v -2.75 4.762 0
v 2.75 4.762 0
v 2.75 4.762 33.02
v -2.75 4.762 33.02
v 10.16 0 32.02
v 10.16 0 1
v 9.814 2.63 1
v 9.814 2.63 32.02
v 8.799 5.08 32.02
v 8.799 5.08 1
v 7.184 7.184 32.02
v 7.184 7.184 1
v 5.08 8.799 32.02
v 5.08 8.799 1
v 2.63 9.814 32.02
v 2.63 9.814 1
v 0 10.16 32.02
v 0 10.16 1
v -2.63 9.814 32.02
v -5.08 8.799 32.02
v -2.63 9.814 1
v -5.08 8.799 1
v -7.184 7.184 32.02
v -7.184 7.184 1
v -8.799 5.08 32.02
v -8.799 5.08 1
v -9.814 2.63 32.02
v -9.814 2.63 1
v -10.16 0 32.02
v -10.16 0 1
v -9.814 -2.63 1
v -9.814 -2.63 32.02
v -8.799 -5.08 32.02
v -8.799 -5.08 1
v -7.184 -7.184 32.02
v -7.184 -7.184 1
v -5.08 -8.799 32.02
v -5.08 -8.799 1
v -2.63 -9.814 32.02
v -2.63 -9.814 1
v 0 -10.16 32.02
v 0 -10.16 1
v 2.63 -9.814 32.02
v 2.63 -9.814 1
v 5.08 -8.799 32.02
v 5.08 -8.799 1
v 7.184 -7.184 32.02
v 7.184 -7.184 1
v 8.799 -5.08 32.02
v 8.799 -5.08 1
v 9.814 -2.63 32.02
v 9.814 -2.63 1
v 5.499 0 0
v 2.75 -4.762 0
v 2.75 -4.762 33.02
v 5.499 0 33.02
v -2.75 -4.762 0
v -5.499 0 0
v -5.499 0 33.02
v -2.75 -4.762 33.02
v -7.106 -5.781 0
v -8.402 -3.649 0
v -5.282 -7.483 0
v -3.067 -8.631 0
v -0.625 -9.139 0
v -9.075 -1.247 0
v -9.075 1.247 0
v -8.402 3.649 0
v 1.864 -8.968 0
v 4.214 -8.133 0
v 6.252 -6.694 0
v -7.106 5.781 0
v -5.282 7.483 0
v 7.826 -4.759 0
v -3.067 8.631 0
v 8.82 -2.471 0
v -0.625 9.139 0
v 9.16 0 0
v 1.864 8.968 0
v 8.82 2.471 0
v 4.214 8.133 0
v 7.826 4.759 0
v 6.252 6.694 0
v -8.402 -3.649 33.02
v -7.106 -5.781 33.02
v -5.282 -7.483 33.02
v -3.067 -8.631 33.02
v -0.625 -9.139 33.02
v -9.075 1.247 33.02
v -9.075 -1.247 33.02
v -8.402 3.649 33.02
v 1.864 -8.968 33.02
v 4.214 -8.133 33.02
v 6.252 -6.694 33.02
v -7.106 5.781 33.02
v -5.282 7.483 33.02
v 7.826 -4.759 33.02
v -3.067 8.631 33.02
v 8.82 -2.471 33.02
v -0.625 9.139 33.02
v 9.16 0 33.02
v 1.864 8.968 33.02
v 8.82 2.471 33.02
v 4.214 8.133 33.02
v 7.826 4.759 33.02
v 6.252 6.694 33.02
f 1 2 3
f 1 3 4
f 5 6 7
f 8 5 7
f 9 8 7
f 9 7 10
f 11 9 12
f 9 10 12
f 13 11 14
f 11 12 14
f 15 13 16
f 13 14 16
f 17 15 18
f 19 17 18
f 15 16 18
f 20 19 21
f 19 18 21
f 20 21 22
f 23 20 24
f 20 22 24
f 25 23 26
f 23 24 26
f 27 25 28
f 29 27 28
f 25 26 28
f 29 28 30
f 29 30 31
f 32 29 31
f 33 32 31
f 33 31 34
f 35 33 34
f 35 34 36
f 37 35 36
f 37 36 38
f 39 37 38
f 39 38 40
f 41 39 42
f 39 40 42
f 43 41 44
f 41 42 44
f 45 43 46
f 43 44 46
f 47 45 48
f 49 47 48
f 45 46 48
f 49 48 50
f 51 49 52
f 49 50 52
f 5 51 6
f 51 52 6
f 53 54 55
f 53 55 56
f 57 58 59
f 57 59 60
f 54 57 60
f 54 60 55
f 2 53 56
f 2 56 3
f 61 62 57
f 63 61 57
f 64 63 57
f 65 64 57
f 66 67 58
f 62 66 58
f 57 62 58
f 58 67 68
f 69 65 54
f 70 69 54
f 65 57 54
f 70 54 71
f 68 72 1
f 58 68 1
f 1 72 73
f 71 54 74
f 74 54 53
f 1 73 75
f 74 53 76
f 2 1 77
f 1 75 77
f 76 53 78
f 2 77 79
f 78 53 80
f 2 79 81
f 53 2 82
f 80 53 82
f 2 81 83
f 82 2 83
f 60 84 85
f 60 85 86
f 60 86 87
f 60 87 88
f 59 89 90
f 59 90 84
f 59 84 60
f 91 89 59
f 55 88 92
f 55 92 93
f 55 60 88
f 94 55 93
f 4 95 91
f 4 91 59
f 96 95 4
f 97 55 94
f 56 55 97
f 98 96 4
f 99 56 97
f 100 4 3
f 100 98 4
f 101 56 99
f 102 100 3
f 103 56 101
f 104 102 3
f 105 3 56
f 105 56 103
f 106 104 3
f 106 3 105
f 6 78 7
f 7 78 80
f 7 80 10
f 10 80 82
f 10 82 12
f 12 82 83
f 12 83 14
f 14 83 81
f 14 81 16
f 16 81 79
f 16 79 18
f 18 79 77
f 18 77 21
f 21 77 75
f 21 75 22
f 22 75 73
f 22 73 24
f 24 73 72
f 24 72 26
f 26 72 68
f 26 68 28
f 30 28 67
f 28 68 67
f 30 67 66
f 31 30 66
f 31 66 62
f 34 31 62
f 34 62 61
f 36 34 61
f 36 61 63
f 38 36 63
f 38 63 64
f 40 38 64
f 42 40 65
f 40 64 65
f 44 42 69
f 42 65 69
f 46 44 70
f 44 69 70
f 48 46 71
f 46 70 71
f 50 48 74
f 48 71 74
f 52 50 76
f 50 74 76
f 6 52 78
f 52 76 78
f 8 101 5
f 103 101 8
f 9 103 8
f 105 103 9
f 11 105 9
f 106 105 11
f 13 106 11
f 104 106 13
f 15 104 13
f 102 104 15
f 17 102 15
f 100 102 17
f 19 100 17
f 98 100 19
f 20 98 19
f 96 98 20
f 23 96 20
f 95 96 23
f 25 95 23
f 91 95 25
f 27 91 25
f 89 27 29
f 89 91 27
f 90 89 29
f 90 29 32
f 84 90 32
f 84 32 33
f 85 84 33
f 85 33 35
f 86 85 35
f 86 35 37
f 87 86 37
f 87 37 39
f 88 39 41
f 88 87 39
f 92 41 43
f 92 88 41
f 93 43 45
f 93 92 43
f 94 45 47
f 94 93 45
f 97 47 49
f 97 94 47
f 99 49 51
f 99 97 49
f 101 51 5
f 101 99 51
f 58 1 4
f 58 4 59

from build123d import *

# Parameters (mm, degrees)
SKETCH1_R           = 10.16
BOSS_EXTRUDE1_DEPTH = 33.02
CHAMFER1_SIZE       = 1


with BuildPart() as part:
    # Sketch1 → Boss-Extrude1 (new body)
    with BuildSketch(Plane.XY):
        Circle(SKETCH1_R)
        Polygon((5.499261314, 0), (2.749630657, 4.7625), (-2.749630657, 4.7625), (-5.499261314, 0), (-2.749630657, -4.7625), (2.749630657, -4.7625), align=None, mode=Mode.SUBTRACT)
    extrude(amount=BOSS_EXTRUDE1_DEPTH)

    # Chamfer1
    chamfer1_edges = [part.edges().sort_by_distance(p)[0] for p in [
        (-10.16, 0, 0),
        (-10.16, 0, 33.02),
    ]]
    chamfer(chamfer1_edges, length=CHAMFER1_SIZE)


solid = part.part
